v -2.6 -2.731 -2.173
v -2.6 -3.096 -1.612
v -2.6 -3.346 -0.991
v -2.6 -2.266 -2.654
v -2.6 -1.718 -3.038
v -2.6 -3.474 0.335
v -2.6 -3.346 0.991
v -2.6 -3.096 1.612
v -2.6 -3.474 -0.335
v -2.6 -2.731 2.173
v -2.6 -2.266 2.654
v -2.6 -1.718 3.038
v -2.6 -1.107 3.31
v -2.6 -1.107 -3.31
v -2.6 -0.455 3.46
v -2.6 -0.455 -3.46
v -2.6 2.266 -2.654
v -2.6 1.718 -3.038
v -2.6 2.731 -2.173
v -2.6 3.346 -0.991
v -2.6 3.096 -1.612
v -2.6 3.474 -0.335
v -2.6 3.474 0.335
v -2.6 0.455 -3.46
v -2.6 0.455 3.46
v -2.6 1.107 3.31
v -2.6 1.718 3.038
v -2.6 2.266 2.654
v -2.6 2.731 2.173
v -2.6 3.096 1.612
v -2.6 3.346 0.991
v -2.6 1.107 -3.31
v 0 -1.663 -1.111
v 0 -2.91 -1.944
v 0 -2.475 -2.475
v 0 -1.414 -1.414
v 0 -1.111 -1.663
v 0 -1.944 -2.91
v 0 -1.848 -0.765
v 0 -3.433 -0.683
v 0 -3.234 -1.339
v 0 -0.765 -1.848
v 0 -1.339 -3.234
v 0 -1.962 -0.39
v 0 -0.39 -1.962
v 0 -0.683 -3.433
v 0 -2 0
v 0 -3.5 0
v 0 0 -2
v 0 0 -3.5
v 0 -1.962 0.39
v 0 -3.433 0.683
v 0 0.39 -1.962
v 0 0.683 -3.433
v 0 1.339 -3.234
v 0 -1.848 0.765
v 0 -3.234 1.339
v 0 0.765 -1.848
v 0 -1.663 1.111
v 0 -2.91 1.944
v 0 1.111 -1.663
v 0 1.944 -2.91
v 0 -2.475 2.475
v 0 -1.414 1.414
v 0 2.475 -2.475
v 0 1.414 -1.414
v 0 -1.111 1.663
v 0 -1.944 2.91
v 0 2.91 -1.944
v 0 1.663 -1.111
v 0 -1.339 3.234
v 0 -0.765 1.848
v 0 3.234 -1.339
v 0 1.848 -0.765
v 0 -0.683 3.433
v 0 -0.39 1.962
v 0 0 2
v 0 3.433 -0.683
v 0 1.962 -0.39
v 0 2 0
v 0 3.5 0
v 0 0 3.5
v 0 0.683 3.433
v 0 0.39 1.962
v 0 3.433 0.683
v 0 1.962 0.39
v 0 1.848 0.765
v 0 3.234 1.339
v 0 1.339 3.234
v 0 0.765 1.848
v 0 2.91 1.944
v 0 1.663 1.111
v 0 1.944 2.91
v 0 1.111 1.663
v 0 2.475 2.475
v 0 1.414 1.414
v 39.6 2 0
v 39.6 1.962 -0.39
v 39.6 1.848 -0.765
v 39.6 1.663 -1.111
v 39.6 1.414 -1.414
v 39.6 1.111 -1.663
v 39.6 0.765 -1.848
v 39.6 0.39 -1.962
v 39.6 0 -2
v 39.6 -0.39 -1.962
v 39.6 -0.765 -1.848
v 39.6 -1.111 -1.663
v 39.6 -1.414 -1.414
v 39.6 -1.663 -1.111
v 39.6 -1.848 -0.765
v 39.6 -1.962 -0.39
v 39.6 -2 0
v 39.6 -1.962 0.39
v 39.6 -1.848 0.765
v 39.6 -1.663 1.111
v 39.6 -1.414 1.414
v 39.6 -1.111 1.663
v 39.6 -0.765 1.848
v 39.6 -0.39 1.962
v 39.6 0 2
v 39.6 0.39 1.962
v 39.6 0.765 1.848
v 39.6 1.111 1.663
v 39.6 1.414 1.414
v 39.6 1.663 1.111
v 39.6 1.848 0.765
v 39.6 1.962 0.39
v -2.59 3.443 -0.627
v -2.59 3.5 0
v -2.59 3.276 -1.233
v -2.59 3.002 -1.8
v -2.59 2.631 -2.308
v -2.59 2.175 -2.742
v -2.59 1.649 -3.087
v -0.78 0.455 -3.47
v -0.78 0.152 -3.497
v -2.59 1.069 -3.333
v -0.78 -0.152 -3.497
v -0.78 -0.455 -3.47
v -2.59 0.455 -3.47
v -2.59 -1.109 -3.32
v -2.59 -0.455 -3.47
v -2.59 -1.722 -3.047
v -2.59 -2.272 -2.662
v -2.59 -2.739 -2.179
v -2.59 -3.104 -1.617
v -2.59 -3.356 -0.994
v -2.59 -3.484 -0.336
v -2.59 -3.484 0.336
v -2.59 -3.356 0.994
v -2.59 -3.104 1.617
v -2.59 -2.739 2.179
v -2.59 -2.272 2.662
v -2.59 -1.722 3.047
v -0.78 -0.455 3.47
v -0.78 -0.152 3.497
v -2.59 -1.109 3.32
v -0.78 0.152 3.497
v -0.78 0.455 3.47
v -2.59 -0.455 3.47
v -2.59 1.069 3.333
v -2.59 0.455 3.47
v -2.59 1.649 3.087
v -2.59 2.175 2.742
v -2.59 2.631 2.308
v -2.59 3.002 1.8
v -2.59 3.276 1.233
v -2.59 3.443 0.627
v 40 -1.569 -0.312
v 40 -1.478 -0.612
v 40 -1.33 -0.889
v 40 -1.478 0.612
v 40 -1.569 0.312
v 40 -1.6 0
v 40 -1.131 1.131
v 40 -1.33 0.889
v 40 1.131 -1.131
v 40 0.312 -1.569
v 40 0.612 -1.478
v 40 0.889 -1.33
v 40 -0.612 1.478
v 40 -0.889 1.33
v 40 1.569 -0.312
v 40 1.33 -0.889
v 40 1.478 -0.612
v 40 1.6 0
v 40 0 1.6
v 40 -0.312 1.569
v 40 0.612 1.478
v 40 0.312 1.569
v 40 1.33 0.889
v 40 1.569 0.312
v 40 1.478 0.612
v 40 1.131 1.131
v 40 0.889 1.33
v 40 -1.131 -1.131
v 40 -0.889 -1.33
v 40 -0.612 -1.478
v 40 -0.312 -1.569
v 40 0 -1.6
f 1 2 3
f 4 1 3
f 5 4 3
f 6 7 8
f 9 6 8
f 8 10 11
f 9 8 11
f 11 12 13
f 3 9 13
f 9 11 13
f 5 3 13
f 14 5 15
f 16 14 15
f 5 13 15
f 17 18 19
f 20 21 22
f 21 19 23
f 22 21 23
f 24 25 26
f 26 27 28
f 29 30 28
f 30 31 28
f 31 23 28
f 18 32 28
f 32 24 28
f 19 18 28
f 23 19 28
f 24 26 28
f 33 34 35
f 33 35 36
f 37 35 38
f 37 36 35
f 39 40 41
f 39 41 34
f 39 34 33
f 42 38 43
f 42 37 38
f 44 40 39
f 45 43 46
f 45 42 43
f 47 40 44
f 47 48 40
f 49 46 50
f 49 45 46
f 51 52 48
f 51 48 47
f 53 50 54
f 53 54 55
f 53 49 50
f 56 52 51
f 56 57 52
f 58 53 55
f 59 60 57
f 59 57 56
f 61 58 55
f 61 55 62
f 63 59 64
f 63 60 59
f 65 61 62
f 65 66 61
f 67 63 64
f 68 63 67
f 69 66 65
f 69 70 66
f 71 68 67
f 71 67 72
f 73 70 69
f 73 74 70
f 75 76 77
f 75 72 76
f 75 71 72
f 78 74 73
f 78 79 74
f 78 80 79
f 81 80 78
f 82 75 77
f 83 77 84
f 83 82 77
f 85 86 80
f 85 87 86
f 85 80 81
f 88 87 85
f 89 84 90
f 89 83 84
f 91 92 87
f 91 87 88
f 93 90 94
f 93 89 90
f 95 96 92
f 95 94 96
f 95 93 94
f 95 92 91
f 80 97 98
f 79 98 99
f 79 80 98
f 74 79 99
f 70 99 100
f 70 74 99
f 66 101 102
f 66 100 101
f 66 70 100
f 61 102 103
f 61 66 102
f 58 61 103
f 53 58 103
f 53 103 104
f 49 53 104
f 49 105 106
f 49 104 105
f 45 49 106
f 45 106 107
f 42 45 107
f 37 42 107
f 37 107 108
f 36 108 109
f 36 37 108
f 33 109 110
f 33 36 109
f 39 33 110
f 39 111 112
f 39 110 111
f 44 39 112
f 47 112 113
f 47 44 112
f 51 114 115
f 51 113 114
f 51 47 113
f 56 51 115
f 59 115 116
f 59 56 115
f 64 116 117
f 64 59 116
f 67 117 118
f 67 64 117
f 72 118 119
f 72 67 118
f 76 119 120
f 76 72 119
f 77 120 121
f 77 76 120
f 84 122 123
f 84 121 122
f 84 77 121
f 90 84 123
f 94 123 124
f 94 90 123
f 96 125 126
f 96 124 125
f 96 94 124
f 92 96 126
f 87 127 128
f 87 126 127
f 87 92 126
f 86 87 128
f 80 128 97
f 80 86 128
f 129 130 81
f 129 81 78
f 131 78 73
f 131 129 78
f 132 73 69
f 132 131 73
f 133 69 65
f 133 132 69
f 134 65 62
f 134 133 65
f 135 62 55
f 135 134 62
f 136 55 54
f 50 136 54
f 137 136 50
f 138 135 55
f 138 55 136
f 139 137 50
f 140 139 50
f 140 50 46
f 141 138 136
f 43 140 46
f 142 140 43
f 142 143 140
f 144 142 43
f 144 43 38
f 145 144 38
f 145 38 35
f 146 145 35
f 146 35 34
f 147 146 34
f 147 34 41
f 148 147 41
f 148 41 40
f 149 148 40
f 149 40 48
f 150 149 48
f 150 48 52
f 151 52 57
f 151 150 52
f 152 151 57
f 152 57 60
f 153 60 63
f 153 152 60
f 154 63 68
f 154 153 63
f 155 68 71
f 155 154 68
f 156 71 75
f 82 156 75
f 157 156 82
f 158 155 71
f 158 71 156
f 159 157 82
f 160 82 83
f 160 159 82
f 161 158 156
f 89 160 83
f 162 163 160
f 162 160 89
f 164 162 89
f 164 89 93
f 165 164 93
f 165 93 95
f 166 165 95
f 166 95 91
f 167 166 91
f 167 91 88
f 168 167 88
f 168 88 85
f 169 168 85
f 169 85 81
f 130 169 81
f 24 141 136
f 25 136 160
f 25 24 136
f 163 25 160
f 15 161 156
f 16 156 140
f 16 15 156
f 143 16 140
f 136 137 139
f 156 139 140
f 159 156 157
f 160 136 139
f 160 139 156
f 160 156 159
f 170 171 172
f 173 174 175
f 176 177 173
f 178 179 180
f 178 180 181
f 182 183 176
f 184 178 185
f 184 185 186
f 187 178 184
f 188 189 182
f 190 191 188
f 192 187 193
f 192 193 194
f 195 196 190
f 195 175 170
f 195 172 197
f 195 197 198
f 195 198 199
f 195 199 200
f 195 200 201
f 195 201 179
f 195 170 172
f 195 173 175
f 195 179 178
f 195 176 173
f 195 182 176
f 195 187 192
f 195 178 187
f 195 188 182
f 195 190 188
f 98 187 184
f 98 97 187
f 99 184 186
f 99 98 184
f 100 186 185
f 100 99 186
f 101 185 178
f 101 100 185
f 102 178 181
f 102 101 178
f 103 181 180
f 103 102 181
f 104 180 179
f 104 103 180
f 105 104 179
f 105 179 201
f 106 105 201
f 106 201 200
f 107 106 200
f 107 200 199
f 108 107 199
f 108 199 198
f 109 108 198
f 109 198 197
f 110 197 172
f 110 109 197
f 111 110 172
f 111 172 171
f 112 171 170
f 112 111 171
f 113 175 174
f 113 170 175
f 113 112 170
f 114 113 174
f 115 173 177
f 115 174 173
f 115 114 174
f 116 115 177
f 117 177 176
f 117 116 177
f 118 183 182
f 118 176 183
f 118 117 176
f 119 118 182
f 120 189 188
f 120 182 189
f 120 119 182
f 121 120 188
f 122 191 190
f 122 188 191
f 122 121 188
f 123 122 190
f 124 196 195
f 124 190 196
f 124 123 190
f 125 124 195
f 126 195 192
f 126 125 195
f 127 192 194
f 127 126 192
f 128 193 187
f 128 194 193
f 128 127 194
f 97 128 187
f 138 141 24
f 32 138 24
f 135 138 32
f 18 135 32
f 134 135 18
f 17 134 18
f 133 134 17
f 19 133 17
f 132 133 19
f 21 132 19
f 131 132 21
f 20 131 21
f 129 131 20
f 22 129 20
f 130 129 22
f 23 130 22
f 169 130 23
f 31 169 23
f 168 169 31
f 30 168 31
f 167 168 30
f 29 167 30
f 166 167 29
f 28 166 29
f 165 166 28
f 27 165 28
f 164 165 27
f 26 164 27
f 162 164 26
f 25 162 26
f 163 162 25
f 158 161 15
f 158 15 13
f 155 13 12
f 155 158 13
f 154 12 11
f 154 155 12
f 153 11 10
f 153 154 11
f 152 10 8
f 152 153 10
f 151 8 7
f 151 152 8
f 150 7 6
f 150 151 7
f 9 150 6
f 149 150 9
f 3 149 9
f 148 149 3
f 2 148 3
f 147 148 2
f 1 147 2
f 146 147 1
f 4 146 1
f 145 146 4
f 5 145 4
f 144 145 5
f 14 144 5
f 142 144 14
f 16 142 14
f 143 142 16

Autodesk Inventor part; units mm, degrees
ref_plane "YZ Plane" through (0, 0, 0) normal (1, 0, 0) x (0, 1, 0)
ref_plane "XZ Plane" through (0, 0, 0) normal (0, 1, 0) x (-1, 0, 0)
sketch "Эскиз1" plane through (0, 0, 0) normal (0, 0, 1) x (1, 0, 0)
  line L0 (-2.6, 0) -> (40, 0)
  line L1 (40, 0) -> (40, 2)
  line L2 (40, 2) -> (18, 2)
  line L3 (18, 2) -> (17.5706, 2)
  line L4 (17.5706, 2) -> (0, 2)
  line L5 (0, 2) -> (0, 3.5)
  line L6 (-11.12, 0) -> (48.52, 0) projected
  line L7 (0, -0.7) -> (0, 4.2) projected
  line L8 (-2.6, 0) -> (-2.6, 3.5)
  line L9 (0, 3.5) -> (-2.6, 3.5)
  dimension "d0" = 40
  dimension "d1" = 22
  dimension "d2" = 0.4294
  dimension "d3" = 2.6
  dimension "d4" = 4
  dimension "d5" = 4
  dimension "d9" = 7
  dimension "d10" = 0
revolve "Базовый элемент" add sketch "Эскиз1" angle 360 about axis through (-2.6, 0, 0) along (1, 0, 0)
sketch "Эскиз2" plane through (-2.6, 0, 0) normal (-1, 0, 0) x (0, 0, 1)
  circle A0 centre (0, 0) radius 3.5 projected
  line L0 (0, 0) -> (0, 3.5) projected
  line L1 (-3.5, 0.455) -> (3.5, 0.455)
  line L2 (3.5, 0.455) -> (3.5, -0.455)
  line L3 (3.5, -0.455) -> (-3.5, -0.455)
  line L4 (-3.5, -0.455) -> (-3.5, 0.455)
  line L5 (-3.5, 0) -> (3.5, 0) construction
  line L6 (0, 0.455) -> (0, -0.455) construction
  dimension "d11" = 0.91
  dimension "d12" = 7
fillet "Сопряжение1" radius 0.01 1 edges at (-2.6, -3.5, 0)
extrude "Паз" cut sketch "Эскиз2" against normal blind 1.82 contours A0 L3 L1 | L2 L3 A0 | A0 L1 L2 | L3 L4 A0 | A0 L4 L1
thread "Резьба" size "M4x0.7" class "6g" standard "ISO Metric profile" length 22
chamfer "Chamfer4" distance 0.4 angle 45 1 edges at (40, -2, 0)
ref_plane "Work Plane1" through (30.1625, 0, 0) normal (0, 0, -1) x (1, 0, 0)
equation "\"d11\" = SBR"
equation "\"d12\" = KOD"
equation "\"d13\" = RR"
equation "\"d16\" = STI"
equation "\"d14\" = GEL"
equation "\"d40\" = 0.1 * GD"
equation "\"d0\" = NLG"
equation "\"d1\" = GEL"
equation "\"d2\" = GAL"
equation "\"d3\" = KOH"
equation "\"d4\" = GD"
equation "\"d5\" = BDM"
equation "\"d9\" = KOD"
equation "\"GD\" = NND"
equation "\"NLG\" = 40"
equation "\"GEL\" = 22"
equation "\"KOD\" = 7"
equation "\"KOH\" = 2.6"
equation "\"GAL\" = 0.61345 * PTC"
equation "\"BDM\" = NND"
equation "\"RR\" = 0.01"
equation "\"SBR\" = 0.91"
equation "\"STI\" = 1.82"
equation "\"KEWI\" = 0"
equation "\"GUL\" = 0.61345 * PTC"
equation "\"SPD\" = NND - 1.2269 * PTC"
equation "\"PTC\" = 0.7"
equation "\"THREADDIA\" = 4"
equation "\"TOA\" = 30deg"
equation "\"FAWI\" = 45deg"
equation "\"NND\" = 4"
equation "\"GD1\" = THREADDIA - 1.2269 * PTC"
properties part number "Винт M4-6gx40 ГОСТ 1491-80" material "Сталь, мягкая"
